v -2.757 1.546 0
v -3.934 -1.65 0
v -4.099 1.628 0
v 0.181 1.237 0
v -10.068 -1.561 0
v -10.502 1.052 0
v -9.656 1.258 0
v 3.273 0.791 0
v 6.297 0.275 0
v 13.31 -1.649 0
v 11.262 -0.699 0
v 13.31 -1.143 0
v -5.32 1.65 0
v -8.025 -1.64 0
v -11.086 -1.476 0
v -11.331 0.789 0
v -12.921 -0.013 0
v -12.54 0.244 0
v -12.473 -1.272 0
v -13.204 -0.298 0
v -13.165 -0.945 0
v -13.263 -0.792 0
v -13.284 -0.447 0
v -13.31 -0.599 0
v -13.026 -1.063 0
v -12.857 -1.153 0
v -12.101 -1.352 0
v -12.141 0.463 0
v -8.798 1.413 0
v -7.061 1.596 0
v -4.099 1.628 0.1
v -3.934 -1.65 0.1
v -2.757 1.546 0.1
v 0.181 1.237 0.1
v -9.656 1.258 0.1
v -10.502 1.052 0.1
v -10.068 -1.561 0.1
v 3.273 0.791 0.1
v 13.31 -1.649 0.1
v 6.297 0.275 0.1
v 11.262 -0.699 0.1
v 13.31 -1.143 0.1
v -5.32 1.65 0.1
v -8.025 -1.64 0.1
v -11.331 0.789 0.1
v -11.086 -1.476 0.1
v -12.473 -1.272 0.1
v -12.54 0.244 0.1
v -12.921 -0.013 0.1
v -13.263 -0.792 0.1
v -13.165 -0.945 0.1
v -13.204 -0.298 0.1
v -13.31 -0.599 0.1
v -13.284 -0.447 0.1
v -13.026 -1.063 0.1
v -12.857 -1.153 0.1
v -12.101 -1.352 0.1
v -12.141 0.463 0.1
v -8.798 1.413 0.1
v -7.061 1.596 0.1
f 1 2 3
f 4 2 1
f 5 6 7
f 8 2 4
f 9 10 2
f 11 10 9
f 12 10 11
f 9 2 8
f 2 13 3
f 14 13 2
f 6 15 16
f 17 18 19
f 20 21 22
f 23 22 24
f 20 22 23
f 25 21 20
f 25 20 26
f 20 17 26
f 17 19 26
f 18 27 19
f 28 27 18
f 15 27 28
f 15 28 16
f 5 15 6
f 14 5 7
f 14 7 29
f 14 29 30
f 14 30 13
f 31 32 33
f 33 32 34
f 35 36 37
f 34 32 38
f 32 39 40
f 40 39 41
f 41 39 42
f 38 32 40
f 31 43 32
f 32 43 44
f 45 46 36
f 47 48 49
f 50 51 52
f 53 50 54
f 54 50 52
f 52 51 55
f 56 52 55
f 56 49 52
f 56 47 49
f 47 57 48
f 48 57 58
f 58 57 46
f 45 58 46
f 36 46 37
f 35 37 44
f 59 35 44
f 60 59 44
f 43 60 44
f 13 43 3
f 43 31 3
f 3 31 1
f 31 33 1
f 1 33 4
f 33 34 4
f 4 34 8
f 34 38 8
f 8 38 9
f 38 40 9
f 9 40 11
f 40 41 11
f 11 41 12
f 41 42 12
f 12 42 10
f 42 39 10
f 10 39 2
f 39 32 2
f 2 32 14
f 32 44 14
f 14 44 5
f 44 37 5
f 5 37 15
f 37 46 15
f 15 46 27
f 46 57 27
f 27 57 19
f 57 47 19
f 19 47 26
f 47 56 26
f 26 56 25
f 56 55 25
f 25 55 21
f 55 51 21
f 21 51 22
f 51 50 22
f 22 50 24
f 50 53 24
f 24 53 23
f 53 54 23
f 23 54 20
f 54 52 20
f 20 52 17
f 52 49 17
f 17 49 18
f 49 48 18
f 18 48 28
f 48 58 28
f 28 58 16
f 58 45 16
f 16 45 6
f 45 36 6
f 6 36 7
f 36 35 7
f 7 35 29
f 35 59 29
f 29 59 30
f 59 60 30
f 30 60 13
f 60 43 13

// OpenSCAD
// Module names are of the form poly_<inkscape-path-id>().  As a result,
// you can associate a polygon in this OpenSCAD program with the corresponding
// SVG element in the Inkscape document by looking for the XML element with
// the attribute id="inkscape-path-id".

// fudge value is used to ensure that subtracted solids are a tad taller
// in the z dimension than the polygon being subtracted from.  This helps
// keep the resulting .stl file manifold.
fudge = 0.1;

module poly_path6(h)
{
  scale([25.4/90, -25.4/90, 1]) union()
  {
    linear_extrude(height=h)
      polygon([[-18.849438,-5.846500],[-25.020296,-5.656378],[-31.175482,-5.006917],[-34.214440,-4.456194],[-37.210171,-3.726148],[-40.149571,-2.795282],[-43.019538,-1.642100],[-44.434396,-0.864579],[-45.783460,0.047444],[-46.785772,1.055592],[-47.069095,1.583721],[-47.160371,2.121490],[-46.996308,2.807604],[-46.648113,3.348944],[-46.154828,3.767527],[-45.555497,4.085372],[-44.194863,4.506917],[-42.878555,4.789720],[-39.281768,5.230490],[-35.674161,5.529804],[-28.436457,5.810590],[-13.940872,5.846500],[47.160371,5.844500],[47.160371,4.050020],[39.905496,2.475636],[22.313222,-0.973038],[11.596348,-2.802821],[0.642069,-4.384282],[-9.767298,-5.478457],[-14.523166,-5.768135],[-18.849438,-5.846380]]);
  }
}

poly_path6(0.10000000149011612);
